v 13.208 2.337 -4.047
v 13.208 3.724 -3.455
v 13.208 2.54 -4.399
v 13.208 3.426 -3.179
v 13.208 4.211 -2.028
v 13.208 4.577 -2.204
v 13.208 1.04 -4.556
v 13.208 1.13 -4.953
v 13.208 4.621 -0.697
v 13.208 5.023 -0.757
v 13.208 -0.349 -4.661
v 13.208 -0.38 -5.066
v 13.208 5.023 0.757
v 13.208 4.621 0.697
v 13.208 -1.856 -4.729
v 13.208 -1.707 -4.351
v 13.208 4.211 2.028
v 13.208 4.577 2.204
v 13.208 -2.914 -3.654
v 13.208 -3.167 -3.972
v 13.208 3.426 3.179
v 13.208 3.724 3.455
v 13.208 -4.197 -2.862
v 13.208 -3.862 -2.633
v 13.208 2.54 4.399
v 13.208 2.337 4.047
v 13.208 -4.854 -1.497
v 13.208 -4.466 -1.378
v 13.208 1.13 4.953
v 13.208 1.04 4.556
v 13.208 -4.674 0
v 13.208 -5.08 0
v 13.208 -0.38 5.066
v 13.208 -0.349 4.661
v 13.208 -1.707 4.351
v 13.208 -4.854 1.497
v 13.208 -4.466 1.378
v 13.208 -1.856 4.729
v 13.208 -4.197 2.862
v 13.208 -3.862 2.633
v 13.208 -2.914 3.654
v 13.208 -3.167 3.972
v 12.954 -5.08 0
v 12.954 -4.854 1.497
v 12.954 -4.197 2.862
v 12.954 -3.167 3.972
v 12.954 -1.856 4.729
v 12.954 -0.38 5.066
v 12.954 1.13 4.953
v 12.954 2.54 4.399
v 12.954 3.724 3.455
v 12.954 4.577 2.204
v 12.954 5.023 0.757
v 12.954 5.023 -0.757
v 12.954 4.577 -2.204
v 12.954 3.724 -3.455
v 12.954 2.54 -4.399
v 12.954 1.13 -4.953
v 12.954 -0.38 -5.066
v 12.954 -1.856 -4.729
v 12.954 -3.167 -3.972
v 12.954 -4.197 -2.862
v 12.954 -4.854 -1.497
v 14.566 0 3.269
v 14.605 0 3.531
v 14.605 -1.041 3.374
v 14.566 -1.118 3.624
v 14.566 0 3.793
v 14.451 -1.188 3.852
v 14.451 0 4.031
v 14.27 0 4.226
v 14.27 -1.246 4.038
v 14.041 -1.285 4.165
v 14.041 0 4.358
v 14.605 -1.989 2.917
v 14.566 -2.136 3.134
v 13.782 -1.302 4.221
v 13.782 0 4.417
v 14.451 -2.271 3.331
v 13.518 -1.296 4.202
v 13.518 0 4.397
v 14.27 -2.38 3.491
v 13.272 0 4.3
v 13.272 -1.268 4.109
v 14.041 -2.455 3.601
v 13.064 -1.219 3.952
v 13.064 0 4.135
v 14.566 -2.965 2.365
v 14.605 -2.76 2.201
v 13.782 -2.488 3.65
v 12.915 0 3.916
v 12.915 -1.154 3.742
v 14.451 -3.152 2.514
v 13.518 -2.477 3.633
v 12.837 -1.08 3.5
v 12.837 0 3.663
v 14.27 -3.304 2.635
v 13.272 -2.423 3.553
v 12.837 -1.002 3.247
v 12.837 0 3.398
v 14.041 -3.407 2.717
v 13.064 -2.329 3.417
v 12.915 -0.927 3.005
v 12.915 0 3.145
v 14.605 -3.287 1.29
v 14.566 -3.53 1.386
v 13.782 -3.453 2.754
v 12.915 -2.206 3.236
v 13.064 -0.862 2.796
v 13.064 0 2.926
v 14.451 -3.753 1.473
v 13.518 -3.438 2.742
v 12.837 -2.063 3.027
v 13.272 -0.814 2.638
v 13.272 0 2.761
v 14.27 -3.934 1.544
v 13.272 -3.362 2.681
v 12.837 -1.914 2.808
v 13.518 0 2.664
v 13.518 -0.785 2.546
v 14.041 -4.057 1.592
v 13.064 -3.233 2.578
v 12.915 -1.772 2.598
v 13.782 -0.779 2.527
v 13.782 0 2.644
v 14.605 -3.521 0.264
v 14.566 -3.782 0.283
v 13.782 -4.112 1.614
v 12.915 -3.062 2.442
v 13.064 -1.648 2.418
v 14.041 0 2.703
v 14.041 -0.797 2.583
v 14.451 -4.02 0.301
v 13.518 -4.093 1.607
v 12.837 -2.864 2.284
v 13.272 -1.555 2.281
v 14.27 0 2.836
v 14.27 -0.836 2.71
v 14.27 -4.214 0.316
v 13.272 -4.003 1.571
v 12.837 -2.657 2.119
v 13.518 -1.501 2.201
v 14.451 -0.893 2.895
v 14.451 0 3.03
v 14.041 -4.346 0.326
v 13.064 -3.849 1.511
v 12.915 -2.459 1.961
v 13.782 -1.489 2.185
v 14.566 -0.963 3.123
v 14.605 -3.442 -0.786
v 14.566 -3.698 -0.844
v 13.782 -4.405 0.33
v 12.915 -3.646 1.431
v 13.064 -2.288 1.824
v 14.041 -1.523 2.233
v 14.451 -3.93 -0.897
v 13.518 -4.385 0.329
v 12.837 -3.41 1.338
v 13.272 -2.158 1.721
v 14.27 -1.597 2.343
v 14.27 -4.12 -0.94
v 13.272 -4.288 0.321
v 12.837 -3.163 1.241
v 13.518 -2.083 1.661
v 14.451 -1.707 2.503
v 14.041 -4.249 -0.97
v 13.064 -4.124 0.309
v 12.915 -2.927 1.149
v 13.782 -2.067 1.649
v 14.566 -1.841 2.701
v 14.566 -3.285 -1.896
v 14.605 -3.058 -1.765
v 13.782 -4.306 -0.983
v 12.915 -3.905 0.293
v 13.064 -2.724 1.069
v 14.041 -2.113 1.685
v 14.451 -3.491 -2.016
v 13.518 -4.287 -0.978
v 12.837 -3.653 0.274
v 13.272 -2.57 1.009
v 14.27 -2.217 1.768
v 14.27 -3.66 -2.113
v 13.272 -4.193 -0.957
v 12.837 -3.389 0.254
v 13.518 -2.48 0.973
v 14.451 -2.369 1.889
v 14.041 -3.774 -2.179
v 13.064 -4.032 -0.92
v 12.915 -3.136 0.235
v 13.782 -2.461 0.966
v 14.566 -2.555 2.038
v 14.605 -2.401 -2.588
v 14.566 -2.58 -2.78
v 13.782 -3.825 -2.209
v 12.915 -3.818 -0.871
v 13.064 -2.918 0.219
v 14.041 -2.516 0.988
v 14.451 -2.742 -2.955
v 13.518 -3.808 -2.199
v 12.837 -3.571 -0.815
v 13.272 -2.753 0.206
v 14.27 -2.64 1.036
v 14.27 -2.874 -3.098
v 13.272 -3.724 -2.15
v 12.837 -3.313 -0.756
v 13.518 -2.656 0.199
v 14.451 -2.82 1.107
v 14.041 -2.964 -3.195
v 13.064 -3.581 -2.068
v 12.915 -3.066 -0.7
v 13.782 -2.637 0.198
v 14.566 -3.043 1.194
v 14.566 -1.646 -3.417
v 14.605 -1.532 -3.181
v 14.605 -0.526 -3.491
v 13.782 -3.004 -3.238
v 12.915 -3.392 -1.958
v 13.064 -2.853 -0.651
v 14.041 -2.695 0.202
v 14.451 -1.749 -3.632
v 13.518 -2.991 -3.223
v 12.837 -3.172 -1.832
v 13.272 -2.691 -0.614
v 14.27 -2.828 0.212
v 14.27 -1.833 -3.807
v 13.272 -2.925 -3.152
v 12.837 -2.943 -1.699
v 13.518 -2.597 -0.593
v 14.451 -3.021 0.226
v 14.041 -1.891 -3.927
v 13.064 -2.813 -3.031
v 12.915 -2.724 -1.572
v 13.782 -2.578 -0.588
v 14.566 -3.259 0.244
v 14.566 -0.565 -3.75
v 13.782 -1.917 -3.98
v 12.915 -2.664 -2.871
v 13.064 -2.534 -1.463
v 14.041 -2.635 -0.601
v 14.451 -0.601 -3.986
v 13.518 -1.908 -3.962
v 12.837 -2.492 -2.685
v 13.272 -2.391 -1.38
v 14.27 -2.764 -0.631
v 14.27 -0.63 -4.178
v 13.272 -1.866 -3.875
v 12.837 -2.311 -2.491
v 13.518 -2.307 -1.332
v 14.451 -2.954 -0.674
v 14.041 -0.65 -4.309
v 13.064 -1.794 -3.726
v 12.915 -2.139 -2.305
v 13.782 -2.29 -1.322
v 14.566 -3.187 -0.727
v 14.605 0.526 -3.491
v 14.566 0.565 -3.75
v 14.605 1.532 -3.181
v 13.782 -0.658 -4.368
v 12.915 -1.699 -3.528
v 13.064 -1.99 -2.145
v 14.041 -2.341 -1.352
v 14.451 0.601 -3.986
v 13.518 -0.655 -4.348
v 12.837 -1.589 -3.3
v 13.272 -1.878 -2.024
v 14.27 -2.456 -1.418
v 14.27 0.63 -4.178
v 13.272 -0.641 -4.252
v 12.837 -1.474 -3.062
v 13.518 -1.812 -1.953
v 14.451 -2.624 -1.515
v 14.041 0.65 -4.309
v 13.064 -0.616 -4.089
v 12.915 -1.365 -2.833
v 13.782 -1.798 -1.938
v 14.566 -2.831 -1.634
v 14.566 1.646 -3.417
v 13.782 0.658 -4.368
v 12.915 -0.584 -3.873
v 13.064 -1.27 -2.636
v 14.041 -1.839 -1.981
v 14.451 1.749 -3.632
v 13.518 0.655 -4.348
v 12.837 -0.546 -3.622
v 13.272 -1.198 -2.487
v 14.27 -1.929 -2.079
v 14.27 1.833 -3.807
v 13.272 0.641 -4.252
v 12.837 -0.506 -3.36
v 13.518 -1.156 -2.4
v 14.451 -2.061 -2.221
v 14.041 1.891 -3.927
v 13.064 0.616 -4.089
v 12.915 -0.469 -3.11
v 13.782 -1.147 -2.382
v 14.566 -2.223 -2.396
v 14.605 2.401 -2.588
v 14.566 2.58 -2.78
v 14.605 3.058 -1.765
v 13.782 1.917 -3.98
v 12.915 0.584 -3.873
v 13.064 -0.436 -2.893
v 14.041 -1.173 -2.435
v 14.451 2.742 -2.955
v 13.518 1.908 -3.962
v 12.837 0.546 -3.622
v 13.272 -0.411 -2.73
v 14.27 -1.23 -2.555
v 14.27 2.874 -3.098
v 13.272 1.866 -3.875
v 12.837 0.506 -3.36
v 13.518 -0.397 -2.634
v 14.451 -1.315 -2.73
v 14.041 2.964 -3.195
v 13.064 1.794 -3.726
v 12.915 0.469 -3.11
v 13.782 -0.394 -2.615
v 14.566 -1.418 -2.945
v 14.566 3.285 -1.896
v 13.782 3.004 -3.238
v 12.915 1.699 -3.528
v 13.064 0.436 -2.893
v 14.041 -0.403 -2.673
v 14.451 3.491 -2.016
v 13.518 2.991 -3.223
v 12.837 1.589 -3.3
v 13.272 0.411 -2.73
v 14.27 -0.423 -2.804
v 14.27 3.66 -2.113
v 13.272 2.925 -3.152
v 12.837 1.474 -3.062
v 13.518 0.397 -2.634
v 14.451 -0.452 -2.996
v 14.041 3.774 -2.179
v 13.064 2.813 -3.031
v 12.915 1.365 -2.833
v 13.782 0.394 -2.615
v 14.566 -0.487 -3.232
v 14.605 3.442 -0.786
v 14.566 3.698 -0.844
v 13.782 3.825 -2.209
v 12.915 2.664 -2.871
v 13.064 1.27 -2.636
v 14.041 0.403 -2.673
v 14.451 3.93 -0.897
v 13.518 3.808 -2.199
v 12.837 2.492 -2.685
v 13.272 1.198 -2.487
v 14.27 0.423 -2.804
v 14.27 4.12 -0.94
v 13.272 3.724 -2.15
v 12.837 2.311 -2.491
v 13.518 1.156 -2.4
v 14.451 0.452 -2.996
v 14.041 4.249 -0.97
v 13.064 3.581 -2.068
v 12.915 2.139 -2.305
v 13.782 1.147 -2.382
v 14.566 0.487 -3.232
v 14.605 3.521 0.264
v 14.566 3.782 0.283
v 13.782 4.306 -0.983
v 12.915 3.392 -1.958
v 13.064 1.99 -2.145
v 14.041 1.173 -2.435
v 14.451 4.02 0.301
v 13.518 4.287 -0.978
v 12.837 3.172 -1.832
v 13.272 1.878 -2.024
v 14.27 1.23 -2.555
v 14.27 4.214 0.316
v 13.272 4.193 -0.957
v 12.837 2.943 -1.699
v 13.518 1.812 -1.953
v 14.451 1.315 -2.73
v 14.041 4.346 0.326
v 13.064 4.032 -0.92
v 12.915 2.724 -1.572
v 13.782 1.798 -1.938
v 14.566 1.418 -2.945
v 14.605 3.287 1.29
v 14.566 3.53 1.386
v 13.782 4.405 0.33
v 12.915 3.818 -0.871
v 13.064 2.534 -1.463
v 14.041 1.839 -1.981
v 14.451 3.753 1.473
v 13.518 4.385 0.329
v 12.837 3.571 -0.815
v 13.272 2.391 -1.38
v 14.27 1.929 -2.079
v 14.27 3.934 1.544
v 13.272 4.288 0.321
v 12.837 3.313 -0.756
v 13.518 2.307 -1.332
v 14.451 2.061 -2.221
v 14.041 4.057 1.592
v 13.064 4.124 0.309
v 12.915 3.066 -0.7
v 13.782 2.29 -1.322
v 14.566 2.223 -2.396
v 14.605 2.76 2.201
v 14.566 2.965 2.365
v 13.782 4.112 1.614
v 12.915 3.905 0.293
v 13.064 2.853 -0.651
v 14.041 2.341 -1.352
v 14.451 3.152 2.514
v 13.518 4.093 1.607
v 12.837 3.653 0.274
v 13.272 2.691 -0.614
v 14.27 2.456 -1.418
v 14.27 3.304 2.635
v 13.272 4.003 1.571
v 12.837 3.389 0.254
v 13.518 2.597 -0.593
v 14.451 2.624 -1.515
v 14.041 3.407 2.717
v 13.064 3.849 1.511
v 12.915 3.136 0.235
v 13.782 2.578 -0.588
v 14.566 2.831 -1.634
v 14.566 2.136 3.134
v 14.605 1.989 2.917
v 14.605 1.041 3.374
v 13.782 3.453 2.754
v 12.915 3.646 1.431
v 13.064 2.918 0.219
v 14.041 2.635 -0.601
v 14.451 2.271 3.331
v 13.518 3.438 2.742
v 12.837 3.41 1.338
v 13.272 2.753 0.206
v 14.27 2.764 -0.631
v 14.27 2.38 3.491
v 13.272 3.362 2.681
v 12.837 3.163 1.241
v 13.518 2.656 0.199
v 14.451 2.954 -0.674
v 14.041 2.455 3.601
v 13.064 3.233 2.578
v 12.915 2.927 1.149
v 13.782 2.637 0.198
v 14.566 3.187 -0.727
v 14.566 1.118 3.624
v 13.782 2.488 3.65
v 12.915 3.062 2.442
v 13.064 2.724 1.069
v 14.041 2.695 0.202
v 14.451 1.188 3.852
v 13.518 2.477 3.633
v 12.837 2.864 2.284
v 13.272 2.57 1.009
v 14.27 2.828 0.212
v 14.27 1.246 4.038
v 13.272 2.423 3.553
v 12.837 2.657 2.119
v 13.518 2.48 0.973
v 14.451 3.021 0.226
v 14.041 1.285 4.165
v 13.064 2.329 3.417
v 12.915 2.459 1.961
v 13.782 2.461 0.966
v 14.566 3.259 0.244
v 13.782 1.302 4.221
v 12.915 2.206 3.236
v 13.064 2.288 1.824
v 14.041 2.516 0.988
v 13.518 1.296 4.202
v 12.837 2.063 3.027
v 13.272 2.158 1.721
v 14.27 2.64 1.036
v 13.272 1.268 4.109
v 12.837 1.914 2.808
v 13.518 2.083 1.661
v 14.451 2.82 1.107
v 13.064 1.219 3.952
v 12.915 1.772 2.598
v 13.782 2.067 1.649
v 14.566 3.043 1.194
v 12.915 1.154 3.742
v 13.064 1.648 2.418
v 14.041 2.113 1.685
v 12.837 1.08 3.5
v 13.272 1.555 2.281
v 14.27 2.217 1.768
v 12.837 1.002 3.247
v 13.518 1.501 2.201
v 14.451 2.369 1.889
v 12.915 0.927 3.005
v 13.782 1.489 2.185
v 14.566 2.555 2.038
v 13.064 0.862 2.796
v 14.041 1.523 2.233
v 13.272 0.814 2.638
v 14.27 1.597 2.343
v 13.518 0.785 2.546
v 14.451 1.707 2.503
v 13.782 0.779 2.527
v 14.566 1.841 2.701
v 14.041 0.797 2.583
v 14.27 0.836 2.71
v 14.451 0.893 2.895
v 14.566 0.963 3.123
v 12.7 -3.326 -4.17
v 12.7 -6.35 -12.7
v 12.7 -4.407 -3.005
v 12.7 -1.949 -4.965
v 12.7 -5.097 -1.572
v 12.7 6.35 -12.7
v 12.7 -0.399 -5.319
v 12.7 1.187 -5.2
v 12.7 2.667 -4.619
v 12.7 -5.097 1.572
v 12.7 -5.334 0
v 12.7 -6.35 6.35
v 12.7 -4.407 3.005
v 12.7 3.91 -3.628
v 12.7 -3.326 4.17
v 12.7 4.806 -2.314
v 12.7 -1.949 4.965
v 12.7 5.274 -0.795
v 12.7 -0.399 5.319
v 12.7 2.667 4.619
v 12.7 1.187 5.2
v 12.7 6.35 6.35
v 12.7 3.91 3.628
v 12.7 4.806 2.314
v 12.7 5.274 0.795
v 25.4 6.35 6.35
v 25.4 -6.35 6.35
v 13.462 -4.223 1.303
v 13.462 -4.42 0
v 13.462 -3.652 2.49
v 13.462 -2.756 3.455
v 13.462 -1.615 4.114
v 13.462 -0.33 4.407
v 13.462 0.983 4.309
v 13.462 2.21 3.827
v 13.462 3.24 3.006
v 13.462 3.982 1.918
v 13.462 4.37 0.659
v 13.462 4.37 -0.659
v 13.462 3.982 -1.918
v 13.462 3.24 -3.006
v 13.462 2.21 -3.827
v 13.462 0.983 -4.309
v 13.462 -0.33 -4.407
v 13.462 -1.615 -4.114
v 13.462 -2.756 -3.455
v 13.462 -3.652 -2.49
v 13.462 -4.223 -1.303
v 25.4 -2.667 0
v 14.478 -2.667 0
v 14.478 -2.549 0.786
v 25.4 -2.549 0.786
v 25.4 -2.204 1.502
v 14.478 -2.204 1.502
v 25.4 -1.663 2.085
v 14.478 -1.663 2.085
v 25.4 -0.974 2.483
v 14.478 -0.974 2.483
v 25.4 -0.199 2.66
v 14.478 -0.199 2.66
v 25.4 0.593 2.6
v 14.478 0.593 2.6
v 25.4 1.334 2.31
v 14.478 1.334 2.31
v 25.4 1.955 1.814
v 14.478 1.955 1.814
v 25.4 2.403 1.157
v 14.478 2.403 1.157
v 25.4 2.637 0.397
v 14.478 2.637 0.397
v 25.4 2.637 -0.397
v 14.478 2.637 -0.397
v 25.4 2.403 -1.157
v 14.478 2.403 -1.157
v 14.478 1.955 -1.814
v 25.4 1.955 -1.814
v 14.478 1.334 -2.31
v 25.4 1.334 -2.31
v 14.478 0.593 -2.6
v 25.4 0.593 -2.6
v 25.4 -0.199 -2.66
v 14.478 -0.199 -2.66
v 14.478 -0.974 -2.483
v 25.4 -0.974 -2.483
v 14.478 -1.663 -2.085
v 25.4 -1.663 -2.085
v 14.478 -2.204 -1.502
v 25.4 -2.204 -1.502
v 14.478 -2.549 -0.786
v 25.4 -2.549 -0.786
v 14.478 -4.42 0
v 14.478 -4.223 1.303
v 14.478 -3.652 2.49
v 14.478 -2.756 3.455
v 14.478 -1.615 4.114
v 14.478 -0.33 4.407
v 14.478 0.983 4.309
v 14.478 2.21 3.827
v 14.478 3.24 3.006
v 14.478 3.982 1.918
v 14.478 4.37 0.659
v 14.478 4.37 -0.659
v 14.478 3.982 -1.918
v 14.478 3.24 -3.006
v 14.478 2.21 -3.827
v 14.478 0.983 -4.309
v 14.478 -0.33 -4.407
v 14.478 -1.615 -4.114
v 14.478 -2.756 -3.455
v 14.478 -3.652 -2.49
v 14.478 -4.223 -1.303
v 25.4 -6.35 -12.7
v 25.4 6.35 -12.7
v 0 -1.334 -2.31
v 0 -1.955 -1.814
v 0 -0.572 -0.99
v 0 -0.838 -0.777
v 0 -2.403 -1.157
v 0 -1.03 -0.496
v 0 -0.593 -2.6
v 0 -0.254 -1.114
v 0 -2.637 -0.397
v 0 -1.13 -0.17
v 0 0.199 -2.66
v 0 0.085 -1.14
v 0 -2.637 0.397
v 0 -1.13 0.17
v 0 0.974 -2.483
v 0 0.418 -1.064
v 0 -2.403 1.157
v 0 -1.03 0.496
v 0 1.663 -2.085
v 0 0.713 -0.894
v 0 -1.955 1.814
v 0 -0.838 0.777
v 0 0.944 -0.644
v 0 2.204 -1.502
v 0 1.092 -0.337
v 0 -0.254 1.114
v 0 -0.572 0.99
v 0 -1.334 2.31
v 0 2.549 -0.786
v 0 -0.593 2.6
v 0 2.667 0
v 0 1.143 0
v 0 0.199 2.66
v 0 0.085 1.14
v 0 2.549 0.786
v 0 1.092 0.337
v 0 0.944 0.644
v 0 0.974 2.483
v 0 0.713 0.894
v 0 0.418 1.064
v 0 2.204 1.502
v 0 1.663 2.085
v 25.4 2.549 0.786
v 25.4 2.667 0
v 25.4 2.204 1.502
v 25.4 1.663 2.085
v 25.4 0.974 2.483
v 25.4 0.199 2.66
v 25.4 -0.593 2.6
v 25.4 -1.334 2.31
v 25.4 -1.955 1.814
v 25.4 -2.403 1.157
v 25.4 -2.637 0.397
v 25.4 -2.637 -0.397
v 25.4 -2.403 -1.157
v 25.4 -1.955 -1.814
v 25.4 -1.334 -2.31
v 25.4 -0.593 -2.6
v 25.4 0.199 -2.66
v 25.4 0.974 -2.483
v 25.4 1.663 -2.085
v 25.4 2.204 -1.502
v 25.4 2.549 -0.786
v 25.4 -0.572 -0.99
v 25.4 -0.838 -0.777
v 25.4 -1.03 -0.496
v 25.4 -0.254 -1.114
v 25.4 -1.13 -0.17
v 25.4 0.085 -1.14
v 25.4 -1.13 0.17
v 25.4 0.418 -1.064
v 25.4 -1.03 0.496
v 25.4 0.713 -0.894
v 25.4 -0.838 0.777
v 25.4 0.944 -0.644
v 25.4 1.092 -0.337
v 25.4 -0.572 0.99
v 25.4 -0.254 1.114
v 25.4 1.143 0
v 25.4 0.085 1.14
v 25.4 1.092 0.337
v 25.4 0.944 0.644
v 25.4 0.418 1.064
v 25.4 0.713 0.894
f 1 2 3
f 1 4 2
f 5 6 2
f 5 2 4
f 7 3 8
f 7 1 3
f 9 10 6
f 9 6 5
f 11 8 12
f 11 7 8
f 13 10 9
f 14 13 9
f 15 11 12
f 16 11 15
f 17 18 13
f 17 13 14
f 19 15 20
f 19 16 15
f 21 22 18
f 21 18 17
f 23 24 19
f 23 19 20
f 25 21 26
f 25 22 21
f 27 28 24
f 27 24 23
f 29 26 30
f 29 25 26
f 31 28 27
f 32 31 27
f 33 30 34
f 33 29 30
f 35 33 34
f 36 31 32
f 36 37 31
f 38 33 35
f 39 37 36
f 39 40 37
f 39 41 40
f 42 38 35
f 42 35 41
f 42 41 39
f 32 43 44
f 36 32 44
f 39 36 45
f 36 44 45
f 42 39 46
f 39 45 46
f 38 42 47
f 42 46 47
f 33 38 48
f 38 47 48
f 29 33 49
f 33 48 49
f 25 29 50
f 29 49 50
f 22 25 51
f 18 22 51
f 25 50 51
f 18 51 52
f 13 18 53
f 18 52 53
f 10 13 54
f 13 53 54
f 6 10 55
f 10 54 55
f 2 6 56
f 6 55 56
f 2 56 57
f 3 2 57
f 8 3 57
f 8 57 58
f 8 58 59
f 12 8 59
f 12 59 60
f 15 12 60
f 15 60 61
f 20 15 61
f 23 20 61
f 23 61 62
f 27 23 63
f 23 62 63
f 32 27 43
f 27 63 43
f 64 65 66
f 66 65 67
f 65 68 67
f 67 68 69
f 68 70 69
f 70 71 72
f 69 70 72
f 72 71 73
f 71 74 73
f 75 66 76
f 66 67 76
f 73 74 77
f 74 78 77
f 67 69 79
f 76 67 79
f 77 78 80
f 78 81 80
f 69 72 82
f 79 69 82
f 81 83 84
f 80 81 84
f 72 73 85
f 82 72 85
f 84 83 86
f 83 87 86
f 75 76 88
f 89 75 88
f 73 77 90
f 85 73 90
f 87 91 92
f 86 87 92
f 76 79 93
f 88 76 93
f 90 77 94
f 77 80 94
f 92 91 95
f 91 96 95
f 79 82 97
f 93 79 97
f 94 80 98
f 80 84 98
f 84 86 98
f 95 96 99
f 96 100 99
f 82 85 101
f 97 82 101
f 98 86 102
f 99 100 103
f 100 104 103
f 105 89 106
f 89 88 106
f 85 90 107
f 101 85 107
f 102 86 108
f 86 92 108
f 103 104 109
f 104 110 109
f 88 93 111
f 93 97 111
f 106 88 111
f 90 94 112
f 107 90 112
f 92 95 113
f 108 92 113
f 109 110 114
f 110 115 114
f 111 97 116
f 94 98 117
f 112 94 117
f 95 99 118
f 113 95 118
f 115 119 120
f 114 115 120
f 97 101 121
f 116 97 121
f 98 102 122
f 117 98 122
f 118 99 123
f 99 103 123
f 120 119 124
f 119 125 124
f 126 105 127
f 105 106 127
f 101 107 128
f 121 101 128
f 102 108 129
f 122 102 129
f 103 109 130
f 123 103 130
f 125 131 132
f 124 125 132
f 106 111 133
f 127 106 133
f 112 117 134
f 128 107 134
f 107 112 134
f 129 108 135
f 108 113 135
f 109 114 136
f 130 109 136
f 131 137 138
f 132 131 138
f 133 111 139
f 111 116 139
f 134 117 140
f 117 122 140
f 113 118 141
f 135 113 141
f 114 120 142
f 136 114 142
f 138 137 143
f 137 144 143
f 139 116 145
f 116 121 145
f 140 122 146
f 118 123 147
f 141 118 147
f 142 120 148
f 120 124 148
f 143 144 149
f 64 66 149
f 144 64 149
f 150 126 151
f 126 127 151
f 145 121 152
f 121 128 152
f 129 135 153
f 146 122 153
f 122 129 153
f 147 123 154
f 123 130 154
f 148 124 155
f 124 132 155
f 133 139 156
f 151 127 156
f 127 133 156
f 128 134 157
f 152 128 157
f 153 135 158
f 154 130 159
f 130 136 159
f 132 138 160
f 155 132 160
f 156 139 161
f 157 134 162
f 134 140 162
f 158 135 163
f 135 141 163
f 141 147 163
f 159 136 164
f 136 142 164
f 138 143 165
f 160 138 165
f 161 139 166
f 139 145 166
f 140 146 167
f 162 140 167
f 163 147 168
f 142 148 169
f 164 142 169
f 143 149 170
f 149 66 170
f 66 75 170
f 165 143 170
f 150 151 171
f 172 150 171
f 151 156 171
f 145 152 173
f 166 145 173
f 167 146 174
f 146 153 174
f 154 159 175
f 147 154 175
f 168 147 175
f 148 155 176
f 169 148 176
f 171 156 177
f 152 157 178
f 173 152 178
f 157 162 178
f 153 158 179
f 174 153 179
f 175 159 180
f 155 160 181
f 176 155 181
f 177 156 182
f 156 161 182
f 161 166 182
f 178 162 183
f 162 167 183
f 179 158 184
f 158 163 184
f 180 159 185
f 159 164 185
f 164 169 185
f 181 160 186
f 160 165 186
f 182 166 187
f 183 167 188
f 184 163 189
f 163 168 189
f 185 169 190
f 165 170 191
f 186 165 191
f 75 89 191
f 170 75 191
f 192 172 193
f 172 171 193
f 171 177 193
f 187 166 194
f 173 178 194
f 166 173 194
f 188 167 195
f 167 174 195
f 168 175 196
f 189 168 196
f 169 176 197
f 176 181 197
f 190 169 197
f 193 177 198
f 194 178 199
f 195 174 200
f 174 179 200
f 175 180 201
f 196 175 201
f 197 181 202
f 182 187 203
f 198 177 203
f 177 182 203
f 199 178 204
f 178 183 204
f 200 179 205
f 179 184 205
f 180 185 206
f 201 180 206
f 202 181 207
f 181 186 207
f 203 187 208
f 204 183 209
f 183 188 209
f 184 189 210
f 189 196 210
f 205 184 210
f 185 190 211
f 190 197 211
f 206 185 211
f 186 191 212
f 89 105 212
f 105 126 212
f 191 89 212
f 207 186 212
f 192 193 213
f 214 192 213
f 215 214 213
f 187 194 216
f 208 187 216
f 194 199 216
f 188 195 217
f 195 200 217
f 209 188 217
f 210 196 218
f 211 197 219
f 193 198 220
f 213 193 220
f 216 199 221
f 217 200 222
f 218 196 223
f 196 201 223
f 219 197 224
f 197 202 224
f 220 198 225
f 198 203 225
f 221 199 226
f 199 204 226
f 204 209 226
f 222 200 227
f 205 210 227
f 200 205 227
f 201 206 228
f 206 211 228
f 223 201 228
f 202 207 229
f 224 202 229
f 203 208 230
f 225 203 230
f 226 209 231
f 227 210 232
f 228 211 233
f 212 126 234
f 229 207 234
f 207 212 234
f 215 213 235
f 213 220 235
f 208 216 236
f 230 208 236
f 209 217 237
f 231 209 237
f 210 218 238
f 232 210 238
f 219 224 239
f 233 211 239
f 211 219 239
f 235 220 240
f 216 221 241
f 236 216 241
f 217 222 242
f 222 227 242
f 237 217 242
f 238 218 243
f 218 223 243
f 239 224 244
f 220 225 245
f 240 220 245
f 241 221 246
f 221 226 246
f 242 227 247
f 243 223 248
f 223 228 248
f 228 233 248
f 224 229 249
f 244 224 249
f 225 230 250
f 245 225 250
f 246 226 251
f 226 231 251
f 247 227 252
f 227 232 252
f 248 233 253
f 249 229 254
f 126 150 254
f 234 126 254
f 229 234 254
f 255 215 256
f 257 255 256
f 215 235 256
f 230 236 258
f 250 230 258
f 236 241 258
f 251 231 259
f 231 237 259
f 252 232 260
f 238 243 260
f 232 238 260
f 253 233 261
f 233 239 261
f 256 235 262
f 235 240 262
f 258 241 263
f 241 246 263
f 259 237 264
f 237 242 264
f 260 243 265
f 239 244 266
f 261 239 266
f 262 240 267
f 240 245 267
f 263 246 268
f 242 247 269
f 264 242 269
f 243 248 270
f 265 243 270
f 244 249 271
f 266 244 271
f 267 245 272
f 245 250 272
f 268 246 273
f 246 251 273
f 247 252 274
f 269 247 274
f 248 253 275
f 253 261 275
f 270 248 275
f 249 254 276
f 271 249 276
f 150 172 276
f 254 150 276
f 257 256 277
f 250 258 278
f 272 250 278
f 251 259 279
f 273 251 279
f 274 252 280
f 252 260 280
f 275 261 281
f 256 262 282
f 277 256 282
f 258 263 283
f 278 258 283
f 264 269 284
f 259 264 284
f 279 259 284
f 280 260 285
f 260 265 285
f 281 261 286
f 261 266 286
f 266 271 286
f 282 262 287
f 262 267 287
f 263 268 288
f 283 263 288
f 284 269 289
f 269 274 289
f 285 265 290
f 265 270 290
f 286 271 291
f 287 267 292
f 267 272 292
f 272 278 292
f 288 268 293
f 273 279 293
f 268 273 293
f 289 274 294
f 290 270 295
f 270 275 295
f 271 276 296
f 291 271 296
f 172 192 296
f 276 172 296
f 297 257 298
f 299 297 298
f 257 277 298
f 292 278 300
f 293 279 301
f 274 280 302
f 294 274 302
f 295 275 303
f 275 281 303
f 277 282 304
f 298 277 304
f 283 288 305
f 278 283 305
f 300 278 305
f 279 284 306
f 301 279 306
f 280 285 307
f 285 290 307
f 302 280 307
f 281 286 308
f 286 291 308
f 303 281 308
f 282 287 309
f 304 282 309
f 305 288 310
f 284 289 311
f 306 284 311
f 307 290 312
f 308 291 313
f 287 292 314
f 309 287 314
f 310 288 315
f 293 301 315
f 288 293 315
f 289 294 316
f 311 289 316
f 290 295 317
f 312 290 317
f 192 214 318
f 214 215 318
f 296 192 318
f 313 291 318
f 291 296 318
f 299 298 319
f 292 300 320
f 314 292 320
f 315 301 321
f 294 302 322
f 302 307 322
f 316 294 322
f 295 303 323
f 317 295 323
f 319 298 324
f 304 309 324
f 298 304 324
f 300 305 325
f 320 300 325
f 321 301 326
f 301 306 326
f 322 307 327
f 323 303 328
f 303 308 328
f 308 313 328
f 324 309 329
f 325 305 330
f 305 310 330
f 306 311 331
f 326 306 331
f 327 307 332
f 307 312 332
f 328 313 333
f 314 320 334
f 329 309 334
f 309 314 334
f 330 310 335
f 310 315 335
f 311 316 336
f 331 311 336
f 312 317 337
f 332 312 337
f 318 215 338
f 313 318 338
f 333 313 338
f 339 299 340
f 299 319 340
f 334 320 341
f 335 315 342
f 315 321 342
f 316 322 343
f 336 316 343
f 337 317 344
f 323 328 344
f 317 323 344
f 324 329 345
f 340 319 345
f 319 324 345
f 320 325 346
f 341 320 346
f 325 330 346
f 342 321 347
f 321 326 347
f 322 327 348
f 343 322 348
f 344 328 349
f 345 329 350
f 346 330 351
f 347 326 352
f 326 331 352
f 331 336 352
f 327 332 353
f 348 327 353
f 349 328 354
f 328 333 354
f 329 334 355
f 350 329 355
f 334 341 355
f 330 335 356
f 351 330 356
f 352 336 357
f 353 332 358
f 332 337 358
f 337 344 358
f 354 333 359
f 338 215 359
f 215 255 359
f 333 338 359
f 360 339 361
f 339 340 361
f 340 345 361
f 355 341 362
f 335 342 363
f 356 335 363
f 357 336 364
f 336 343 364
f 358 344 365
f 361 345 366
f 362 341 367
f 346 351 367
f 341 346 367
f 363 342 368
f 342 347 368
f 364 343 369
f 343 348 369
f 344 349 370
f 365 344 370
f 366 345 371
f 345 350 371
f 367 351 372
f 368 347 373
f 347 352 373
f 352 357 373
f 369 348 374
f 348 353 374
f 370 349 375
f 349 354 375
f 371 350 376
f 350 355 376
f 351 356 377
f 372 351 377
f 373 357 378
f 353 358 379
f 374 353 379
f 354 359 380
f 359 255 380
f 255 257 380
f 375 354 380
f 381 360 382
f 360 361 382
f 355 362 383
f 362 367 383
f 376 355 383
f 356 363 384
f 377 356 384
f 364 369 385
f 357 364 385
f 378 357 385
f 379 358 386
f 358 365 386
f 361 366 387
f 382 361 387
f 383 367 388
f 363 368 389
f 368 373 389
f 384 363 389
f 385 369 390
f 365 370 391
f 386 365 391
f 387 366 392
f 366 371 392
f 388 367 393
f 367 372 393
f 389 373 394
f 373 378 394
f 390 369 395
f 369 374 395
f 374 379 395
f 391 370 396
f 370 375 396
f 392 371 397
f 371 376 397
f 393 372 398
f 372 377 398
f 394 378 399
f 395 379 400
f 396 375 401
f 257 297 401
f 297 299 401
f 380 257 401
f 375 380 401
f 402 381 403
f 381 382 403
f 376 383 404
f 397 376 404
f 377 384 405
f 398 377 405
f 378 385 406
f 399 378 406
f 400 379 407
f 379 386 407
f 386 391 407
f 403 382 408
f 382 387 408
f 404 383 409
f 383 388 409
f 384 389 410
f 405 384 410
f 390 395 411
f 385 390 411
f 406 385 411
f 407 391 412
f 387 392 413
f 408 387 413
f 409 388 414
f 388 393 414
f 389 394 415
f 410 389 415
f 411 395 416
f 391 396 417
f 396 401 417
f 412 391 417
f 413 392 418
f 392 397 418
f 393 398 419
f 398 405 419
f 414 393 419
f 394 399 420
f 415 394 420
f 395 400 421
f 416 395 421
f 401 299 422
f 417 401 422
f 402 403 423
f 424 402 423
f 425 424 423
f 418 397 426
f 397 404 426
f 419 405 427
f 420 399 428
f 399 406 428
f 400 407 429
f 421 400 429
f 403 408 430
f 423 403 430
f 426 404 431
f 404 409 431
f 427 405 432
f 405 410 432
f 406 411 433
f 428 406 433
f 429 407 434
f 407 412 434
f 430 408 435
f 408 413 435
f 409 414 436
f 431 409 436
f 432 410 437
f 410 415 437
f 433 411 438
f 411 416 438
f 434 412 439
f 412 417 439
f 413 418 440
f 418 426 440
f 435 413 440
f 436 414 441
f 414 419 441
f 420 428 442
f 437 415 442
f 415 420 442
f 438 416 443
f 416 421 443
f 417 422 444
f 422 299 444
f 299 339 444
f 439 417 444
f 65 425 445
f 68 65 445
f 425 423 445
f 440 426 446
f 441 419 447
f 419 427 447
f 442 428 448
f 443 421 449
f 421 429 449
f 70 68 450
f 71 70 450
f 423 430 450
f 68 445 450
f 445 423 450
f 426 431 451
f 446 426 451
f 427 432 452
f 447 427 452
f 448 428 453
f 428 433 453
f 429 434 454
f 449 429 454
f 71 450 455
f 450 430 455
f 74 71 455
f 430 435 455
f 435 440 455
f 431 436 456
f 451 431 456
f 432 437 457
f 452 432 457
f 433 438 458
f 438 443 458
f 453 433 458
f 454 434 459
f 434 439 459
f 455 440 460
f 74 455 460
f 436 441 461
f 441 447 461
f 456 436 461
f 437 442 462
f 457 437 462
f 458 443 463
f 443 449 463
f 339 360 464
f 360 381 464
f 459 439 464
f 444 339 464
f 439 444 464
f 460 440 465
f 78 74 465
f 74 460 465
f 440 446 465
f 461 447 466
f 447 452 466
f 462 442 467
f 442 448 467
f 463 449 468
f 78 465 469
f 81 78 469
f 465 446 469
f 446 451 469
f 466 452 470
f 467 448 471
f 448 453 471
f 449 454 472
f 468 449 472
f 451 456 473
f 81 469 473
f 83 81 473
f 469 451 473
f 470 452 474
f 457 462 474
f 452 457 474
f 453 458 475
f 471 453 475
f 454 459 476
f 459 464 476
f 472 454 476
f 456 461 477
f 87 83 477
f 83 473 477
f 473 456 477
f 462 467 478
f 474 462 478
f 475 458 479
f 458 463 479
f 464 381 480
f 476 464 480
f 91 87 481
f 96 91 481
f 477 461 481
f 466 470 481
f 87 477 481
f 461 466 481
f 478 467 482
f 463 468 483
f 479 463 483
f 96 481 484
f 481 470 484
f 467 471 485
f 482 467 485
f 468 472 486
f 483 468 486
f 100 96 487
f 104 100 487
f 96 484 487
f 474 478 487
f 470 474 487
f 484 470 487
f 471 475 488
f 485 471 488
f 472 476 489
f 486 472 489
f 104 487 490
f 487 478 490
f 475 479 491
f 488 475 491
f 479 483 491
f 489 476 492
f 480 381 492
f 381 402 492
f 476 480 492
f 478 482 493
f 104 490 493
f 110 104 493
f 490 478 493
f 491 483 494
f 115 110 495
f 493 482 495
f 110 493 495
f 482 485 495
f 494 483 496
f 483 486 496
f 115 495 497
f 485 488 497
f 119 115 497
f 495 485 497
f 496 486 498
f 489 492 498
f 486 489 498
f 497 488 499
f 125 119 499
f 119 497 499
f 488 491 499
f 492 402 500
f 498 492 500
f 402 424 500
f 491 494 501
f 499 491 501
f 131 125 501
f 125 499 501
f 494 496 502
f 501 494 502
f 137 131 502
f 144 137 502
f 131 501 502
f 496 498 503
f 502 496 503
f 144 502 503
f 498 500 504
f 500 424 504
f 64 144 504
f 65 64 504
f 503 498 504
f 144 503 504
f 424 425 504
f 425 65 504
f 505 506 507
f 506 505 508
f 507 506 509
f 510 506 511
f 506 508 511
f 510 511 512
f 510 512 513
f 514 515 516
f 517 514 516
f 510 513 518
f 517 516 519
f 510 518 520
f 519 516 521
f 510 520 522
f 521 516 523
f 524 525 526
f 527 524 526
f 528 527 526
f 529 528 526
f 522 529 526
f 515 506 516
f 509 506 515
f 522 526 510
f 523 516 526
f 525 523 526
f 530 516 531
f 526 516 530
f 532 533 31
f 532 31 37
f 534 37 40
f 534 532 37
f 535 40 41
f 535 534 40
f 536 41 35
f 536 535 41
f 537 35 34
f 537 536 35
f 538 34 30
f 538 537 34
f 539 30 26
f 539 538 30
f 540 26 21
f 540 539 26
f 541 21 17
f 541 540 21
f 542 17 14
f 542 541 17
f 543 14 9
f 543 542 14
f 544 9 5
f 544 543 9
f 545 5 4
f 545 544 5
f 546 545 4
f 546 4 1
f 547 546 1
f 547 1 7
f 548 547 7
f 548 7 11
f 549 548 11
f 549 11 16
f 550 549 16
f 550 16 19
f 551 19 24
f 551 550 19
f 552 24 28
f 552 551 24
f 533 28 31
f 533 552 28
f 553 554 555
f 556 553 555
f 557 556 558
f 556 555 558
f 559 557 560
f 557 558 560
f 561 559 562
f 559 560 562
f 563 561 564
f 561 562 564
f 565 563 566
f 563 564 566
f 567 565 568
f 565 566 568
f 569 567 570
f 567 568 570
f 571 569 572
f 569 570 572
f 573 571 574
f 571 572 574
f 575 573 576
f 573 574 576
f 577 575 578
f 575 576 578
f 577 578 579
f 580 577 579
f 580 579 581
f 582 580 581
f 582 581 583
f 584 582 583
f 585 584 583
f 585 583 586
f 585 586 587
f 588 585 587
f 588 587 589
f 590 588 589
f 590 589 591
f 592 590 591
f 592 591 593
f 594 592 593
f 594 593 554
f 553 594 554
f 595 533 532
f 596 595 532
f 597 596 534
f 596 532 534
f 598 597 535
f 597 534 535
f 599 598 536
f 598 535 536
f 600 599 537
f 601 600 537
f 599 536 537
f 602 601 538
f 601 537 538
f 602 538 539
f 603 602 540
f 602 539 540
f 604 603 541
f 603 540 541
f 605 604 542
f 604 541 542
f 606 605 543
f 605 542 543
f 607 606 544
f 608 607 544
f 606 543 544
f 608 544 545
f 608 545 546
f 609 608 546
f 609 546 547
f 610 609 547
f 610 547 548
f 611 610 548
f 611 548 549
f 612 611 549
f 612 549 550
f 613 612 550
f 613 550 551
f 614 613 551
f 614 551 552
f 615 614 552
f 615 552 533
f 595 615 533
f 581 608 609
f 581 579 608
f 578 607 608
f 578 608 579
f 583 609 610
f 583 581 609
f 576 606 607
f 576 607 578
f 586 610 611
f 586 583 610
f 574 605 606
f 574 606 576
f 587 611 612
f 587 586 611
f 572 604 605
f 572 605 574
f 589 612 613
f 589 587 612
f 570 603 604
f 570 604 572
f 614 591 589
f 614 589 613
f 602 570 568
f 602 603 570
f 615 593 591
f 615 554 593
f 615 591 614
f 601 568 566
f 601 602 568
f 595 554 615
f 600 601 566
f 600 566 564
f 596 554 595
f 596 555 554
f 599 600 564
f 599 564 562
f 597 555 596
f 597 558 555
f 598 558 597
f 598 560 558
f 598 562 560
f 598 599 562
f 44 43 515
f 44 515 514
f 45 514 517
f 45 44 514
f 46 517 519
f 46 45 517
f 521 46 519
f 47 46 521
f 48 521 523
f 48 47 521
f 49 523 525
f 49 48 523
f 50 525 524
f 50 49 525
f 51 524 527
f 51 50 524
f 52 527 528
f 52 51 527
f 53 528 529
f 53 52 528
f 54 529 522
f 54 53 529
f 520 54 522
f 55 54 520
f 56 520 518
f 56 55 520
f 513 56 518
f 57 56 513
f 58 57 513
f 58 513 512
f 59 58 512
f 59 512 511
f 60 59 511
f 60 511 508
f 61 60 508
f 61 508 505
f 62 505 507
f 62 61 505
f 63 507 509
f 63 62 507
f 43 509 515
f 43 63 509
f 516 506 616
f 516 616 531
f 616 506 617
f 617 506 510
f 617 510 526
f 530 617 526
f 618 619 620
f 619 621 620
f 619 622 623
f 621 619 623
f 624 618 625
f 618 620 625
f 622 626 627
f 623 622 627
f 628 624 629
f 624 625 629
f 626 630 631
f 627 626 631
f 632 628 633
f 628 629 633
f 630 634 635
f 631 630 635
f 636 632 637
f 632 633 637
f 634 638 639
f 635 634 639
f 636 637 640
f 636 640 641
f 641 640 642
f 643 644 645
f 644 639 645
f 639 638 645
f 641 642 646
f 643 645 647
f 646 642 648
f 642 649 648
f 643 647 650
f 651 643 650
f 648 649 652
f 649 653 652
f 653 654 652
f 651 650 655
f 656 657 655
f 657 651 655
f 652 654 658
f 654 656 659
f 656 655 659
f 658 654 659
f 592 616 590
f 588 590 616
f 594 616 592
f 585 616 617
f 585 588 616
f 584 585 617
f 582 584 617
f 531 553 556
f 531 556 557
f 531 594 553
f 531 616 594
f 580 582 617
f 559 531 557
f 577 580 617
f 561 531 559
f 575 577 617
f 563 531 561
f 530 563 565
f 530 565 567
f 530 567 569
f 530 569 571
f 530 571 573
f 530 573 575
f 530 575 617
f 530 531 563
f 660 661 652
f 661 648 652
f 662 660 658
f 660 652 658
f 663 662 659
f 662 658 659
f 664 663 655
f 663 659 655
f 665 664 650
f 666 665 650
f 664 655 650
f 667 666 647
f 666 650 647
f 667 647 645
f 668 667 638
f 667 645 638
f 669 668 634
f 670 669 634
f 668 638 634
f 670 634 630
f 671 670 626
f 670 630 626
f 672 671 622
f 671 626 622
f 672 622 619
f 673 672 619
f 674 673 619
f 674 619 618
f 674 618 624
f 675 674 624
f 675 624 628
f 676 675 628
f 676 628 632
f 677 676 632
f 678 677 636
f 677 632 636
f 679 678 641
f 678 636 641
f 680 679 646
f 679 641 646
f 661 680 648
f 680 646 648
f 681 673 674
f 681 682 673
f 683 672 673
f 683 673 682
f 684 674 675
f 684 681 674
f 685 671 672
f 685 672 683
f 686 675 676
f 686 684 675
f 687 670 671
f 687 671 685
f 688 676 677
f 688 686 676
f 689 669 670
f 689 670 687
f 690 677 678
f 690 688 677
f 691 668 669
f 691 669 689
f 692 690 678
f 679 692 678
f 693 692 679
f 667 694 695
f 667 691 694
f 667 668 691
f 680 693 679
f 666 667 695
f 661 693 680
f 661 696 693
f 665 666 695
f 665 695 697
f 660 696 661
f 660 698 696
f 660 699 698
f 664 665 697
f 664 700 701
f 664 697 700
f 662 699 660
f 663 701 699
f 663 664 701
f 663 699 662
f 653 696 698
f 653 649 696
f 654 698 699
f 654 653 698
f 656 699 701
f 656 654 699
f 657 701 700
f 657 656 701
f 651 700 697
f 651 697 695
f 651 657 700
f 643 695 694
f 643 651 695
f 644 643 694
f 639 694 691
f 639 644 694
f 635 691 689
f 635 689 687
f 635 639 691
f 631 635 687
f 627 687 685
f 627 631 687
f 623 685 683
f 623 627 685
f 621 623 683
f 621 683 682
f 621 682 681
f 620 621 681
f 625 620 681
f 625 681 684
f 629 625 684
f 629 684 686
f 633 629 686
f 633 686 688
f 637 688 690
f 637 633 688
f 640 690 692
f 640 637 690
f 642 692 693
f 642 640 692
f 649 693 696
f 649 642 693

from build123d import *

# Parameters (mm, degrees)
F0_R      = 2.667
F0_R_2    = 1.143
F1_DEPTH  = 12.7
F3_R      = 0.889
F5_W      = 12.7
F5_H      = 19.05
F6_DEPTH  = 12.7
F7_R      = 2.667
F8_DEPTH  = 12.701
F9_R      = 4.4196
F10_DEPTH = 1.778
F11_R     = 5.08
F12_DEPTH = 0.508
F13_SIZE  = 0.254
F14_R     = 2.667
F14_R_2   = 1.143
F15_DEPTH = 12.7


with BuildPart() as f1:
    # F0 (on Right) → F1 (new body)
    with BuildSketch(Plane.YZ):
        Circle(F0_R)
        Circle(F0_R_2, mode=Mode.SUBTRACT)
    extrude(amount=F1_DEPTH)

    # F14 (on face) → F15 (join)
    with BuildSketch(Plane.YZ.offset(12.7)):
        Circle(F14_R)
        Circle(F14_R_2, mode=Mode.SUBTRACT)
    extrude(amount=F15_DEPTH)


with BuildPart() as f4:
    # F3 (on Front) → F4 (revolve)
    with BuildSketch(Plane.XZ):
        with Locations((13.716, 3.5306)):
            Circle(F3_R)
    revolve(axis=Axis((18.1991, 0, 0), (1, 0, 0)))


with BuildPart() as f6:
    # F5 (on face) → F6 (new body)
    with BuildSketch(Plane.YZ.offset(12.7)):
        with Locations((0, -3.175)):
            Rectangle(F5_W, F5_H)
    extrude(amount=F6_DEPTH)

    # F7 (on face) → F8 (cut, through all)
    with BuildSketch(Plane(origin=(12.7, 0, 0), x_dir=(0, -1, 0), z_dir=(-1, 0, 0))):
        Circle(F7_R)
    extrude(amount=-F8_DEPTH, mode=Mode.SUBTRACT)

    # F9 (on face) → F10 (cut)
    with BuildSketch(Plane(origin=(12.7, 0, 0), x_dir=(0, -1, 0), z_dir=(-1, 0, 0))):
        Circle(F9_R)
    extrude(amount=-F10_DEPTH, mode=Mode.SUBTRACT)

    # F11 (on face) → F12 (cut)
    with BuildSketch(Plane(origin=(12.7, 0, 0), x_dir=(0, -1, 0), z_dir=(-1, 0, 0))):
        Circle(F11_R)
    extrude(amount=-F12_DEPTH, mode=Mode.SUBTRACT)

    # F13
    f13_edges = [f6.edges().sort_by_distance(p)[0] for p in [
        (12.7, 5.08, 0),
        (13.208, 4.4196, 0),
    ]]
    chamfer(f13_edges, length=F13_SIZE)


solid = Compound([f1.part, f4.part, f6.part])
